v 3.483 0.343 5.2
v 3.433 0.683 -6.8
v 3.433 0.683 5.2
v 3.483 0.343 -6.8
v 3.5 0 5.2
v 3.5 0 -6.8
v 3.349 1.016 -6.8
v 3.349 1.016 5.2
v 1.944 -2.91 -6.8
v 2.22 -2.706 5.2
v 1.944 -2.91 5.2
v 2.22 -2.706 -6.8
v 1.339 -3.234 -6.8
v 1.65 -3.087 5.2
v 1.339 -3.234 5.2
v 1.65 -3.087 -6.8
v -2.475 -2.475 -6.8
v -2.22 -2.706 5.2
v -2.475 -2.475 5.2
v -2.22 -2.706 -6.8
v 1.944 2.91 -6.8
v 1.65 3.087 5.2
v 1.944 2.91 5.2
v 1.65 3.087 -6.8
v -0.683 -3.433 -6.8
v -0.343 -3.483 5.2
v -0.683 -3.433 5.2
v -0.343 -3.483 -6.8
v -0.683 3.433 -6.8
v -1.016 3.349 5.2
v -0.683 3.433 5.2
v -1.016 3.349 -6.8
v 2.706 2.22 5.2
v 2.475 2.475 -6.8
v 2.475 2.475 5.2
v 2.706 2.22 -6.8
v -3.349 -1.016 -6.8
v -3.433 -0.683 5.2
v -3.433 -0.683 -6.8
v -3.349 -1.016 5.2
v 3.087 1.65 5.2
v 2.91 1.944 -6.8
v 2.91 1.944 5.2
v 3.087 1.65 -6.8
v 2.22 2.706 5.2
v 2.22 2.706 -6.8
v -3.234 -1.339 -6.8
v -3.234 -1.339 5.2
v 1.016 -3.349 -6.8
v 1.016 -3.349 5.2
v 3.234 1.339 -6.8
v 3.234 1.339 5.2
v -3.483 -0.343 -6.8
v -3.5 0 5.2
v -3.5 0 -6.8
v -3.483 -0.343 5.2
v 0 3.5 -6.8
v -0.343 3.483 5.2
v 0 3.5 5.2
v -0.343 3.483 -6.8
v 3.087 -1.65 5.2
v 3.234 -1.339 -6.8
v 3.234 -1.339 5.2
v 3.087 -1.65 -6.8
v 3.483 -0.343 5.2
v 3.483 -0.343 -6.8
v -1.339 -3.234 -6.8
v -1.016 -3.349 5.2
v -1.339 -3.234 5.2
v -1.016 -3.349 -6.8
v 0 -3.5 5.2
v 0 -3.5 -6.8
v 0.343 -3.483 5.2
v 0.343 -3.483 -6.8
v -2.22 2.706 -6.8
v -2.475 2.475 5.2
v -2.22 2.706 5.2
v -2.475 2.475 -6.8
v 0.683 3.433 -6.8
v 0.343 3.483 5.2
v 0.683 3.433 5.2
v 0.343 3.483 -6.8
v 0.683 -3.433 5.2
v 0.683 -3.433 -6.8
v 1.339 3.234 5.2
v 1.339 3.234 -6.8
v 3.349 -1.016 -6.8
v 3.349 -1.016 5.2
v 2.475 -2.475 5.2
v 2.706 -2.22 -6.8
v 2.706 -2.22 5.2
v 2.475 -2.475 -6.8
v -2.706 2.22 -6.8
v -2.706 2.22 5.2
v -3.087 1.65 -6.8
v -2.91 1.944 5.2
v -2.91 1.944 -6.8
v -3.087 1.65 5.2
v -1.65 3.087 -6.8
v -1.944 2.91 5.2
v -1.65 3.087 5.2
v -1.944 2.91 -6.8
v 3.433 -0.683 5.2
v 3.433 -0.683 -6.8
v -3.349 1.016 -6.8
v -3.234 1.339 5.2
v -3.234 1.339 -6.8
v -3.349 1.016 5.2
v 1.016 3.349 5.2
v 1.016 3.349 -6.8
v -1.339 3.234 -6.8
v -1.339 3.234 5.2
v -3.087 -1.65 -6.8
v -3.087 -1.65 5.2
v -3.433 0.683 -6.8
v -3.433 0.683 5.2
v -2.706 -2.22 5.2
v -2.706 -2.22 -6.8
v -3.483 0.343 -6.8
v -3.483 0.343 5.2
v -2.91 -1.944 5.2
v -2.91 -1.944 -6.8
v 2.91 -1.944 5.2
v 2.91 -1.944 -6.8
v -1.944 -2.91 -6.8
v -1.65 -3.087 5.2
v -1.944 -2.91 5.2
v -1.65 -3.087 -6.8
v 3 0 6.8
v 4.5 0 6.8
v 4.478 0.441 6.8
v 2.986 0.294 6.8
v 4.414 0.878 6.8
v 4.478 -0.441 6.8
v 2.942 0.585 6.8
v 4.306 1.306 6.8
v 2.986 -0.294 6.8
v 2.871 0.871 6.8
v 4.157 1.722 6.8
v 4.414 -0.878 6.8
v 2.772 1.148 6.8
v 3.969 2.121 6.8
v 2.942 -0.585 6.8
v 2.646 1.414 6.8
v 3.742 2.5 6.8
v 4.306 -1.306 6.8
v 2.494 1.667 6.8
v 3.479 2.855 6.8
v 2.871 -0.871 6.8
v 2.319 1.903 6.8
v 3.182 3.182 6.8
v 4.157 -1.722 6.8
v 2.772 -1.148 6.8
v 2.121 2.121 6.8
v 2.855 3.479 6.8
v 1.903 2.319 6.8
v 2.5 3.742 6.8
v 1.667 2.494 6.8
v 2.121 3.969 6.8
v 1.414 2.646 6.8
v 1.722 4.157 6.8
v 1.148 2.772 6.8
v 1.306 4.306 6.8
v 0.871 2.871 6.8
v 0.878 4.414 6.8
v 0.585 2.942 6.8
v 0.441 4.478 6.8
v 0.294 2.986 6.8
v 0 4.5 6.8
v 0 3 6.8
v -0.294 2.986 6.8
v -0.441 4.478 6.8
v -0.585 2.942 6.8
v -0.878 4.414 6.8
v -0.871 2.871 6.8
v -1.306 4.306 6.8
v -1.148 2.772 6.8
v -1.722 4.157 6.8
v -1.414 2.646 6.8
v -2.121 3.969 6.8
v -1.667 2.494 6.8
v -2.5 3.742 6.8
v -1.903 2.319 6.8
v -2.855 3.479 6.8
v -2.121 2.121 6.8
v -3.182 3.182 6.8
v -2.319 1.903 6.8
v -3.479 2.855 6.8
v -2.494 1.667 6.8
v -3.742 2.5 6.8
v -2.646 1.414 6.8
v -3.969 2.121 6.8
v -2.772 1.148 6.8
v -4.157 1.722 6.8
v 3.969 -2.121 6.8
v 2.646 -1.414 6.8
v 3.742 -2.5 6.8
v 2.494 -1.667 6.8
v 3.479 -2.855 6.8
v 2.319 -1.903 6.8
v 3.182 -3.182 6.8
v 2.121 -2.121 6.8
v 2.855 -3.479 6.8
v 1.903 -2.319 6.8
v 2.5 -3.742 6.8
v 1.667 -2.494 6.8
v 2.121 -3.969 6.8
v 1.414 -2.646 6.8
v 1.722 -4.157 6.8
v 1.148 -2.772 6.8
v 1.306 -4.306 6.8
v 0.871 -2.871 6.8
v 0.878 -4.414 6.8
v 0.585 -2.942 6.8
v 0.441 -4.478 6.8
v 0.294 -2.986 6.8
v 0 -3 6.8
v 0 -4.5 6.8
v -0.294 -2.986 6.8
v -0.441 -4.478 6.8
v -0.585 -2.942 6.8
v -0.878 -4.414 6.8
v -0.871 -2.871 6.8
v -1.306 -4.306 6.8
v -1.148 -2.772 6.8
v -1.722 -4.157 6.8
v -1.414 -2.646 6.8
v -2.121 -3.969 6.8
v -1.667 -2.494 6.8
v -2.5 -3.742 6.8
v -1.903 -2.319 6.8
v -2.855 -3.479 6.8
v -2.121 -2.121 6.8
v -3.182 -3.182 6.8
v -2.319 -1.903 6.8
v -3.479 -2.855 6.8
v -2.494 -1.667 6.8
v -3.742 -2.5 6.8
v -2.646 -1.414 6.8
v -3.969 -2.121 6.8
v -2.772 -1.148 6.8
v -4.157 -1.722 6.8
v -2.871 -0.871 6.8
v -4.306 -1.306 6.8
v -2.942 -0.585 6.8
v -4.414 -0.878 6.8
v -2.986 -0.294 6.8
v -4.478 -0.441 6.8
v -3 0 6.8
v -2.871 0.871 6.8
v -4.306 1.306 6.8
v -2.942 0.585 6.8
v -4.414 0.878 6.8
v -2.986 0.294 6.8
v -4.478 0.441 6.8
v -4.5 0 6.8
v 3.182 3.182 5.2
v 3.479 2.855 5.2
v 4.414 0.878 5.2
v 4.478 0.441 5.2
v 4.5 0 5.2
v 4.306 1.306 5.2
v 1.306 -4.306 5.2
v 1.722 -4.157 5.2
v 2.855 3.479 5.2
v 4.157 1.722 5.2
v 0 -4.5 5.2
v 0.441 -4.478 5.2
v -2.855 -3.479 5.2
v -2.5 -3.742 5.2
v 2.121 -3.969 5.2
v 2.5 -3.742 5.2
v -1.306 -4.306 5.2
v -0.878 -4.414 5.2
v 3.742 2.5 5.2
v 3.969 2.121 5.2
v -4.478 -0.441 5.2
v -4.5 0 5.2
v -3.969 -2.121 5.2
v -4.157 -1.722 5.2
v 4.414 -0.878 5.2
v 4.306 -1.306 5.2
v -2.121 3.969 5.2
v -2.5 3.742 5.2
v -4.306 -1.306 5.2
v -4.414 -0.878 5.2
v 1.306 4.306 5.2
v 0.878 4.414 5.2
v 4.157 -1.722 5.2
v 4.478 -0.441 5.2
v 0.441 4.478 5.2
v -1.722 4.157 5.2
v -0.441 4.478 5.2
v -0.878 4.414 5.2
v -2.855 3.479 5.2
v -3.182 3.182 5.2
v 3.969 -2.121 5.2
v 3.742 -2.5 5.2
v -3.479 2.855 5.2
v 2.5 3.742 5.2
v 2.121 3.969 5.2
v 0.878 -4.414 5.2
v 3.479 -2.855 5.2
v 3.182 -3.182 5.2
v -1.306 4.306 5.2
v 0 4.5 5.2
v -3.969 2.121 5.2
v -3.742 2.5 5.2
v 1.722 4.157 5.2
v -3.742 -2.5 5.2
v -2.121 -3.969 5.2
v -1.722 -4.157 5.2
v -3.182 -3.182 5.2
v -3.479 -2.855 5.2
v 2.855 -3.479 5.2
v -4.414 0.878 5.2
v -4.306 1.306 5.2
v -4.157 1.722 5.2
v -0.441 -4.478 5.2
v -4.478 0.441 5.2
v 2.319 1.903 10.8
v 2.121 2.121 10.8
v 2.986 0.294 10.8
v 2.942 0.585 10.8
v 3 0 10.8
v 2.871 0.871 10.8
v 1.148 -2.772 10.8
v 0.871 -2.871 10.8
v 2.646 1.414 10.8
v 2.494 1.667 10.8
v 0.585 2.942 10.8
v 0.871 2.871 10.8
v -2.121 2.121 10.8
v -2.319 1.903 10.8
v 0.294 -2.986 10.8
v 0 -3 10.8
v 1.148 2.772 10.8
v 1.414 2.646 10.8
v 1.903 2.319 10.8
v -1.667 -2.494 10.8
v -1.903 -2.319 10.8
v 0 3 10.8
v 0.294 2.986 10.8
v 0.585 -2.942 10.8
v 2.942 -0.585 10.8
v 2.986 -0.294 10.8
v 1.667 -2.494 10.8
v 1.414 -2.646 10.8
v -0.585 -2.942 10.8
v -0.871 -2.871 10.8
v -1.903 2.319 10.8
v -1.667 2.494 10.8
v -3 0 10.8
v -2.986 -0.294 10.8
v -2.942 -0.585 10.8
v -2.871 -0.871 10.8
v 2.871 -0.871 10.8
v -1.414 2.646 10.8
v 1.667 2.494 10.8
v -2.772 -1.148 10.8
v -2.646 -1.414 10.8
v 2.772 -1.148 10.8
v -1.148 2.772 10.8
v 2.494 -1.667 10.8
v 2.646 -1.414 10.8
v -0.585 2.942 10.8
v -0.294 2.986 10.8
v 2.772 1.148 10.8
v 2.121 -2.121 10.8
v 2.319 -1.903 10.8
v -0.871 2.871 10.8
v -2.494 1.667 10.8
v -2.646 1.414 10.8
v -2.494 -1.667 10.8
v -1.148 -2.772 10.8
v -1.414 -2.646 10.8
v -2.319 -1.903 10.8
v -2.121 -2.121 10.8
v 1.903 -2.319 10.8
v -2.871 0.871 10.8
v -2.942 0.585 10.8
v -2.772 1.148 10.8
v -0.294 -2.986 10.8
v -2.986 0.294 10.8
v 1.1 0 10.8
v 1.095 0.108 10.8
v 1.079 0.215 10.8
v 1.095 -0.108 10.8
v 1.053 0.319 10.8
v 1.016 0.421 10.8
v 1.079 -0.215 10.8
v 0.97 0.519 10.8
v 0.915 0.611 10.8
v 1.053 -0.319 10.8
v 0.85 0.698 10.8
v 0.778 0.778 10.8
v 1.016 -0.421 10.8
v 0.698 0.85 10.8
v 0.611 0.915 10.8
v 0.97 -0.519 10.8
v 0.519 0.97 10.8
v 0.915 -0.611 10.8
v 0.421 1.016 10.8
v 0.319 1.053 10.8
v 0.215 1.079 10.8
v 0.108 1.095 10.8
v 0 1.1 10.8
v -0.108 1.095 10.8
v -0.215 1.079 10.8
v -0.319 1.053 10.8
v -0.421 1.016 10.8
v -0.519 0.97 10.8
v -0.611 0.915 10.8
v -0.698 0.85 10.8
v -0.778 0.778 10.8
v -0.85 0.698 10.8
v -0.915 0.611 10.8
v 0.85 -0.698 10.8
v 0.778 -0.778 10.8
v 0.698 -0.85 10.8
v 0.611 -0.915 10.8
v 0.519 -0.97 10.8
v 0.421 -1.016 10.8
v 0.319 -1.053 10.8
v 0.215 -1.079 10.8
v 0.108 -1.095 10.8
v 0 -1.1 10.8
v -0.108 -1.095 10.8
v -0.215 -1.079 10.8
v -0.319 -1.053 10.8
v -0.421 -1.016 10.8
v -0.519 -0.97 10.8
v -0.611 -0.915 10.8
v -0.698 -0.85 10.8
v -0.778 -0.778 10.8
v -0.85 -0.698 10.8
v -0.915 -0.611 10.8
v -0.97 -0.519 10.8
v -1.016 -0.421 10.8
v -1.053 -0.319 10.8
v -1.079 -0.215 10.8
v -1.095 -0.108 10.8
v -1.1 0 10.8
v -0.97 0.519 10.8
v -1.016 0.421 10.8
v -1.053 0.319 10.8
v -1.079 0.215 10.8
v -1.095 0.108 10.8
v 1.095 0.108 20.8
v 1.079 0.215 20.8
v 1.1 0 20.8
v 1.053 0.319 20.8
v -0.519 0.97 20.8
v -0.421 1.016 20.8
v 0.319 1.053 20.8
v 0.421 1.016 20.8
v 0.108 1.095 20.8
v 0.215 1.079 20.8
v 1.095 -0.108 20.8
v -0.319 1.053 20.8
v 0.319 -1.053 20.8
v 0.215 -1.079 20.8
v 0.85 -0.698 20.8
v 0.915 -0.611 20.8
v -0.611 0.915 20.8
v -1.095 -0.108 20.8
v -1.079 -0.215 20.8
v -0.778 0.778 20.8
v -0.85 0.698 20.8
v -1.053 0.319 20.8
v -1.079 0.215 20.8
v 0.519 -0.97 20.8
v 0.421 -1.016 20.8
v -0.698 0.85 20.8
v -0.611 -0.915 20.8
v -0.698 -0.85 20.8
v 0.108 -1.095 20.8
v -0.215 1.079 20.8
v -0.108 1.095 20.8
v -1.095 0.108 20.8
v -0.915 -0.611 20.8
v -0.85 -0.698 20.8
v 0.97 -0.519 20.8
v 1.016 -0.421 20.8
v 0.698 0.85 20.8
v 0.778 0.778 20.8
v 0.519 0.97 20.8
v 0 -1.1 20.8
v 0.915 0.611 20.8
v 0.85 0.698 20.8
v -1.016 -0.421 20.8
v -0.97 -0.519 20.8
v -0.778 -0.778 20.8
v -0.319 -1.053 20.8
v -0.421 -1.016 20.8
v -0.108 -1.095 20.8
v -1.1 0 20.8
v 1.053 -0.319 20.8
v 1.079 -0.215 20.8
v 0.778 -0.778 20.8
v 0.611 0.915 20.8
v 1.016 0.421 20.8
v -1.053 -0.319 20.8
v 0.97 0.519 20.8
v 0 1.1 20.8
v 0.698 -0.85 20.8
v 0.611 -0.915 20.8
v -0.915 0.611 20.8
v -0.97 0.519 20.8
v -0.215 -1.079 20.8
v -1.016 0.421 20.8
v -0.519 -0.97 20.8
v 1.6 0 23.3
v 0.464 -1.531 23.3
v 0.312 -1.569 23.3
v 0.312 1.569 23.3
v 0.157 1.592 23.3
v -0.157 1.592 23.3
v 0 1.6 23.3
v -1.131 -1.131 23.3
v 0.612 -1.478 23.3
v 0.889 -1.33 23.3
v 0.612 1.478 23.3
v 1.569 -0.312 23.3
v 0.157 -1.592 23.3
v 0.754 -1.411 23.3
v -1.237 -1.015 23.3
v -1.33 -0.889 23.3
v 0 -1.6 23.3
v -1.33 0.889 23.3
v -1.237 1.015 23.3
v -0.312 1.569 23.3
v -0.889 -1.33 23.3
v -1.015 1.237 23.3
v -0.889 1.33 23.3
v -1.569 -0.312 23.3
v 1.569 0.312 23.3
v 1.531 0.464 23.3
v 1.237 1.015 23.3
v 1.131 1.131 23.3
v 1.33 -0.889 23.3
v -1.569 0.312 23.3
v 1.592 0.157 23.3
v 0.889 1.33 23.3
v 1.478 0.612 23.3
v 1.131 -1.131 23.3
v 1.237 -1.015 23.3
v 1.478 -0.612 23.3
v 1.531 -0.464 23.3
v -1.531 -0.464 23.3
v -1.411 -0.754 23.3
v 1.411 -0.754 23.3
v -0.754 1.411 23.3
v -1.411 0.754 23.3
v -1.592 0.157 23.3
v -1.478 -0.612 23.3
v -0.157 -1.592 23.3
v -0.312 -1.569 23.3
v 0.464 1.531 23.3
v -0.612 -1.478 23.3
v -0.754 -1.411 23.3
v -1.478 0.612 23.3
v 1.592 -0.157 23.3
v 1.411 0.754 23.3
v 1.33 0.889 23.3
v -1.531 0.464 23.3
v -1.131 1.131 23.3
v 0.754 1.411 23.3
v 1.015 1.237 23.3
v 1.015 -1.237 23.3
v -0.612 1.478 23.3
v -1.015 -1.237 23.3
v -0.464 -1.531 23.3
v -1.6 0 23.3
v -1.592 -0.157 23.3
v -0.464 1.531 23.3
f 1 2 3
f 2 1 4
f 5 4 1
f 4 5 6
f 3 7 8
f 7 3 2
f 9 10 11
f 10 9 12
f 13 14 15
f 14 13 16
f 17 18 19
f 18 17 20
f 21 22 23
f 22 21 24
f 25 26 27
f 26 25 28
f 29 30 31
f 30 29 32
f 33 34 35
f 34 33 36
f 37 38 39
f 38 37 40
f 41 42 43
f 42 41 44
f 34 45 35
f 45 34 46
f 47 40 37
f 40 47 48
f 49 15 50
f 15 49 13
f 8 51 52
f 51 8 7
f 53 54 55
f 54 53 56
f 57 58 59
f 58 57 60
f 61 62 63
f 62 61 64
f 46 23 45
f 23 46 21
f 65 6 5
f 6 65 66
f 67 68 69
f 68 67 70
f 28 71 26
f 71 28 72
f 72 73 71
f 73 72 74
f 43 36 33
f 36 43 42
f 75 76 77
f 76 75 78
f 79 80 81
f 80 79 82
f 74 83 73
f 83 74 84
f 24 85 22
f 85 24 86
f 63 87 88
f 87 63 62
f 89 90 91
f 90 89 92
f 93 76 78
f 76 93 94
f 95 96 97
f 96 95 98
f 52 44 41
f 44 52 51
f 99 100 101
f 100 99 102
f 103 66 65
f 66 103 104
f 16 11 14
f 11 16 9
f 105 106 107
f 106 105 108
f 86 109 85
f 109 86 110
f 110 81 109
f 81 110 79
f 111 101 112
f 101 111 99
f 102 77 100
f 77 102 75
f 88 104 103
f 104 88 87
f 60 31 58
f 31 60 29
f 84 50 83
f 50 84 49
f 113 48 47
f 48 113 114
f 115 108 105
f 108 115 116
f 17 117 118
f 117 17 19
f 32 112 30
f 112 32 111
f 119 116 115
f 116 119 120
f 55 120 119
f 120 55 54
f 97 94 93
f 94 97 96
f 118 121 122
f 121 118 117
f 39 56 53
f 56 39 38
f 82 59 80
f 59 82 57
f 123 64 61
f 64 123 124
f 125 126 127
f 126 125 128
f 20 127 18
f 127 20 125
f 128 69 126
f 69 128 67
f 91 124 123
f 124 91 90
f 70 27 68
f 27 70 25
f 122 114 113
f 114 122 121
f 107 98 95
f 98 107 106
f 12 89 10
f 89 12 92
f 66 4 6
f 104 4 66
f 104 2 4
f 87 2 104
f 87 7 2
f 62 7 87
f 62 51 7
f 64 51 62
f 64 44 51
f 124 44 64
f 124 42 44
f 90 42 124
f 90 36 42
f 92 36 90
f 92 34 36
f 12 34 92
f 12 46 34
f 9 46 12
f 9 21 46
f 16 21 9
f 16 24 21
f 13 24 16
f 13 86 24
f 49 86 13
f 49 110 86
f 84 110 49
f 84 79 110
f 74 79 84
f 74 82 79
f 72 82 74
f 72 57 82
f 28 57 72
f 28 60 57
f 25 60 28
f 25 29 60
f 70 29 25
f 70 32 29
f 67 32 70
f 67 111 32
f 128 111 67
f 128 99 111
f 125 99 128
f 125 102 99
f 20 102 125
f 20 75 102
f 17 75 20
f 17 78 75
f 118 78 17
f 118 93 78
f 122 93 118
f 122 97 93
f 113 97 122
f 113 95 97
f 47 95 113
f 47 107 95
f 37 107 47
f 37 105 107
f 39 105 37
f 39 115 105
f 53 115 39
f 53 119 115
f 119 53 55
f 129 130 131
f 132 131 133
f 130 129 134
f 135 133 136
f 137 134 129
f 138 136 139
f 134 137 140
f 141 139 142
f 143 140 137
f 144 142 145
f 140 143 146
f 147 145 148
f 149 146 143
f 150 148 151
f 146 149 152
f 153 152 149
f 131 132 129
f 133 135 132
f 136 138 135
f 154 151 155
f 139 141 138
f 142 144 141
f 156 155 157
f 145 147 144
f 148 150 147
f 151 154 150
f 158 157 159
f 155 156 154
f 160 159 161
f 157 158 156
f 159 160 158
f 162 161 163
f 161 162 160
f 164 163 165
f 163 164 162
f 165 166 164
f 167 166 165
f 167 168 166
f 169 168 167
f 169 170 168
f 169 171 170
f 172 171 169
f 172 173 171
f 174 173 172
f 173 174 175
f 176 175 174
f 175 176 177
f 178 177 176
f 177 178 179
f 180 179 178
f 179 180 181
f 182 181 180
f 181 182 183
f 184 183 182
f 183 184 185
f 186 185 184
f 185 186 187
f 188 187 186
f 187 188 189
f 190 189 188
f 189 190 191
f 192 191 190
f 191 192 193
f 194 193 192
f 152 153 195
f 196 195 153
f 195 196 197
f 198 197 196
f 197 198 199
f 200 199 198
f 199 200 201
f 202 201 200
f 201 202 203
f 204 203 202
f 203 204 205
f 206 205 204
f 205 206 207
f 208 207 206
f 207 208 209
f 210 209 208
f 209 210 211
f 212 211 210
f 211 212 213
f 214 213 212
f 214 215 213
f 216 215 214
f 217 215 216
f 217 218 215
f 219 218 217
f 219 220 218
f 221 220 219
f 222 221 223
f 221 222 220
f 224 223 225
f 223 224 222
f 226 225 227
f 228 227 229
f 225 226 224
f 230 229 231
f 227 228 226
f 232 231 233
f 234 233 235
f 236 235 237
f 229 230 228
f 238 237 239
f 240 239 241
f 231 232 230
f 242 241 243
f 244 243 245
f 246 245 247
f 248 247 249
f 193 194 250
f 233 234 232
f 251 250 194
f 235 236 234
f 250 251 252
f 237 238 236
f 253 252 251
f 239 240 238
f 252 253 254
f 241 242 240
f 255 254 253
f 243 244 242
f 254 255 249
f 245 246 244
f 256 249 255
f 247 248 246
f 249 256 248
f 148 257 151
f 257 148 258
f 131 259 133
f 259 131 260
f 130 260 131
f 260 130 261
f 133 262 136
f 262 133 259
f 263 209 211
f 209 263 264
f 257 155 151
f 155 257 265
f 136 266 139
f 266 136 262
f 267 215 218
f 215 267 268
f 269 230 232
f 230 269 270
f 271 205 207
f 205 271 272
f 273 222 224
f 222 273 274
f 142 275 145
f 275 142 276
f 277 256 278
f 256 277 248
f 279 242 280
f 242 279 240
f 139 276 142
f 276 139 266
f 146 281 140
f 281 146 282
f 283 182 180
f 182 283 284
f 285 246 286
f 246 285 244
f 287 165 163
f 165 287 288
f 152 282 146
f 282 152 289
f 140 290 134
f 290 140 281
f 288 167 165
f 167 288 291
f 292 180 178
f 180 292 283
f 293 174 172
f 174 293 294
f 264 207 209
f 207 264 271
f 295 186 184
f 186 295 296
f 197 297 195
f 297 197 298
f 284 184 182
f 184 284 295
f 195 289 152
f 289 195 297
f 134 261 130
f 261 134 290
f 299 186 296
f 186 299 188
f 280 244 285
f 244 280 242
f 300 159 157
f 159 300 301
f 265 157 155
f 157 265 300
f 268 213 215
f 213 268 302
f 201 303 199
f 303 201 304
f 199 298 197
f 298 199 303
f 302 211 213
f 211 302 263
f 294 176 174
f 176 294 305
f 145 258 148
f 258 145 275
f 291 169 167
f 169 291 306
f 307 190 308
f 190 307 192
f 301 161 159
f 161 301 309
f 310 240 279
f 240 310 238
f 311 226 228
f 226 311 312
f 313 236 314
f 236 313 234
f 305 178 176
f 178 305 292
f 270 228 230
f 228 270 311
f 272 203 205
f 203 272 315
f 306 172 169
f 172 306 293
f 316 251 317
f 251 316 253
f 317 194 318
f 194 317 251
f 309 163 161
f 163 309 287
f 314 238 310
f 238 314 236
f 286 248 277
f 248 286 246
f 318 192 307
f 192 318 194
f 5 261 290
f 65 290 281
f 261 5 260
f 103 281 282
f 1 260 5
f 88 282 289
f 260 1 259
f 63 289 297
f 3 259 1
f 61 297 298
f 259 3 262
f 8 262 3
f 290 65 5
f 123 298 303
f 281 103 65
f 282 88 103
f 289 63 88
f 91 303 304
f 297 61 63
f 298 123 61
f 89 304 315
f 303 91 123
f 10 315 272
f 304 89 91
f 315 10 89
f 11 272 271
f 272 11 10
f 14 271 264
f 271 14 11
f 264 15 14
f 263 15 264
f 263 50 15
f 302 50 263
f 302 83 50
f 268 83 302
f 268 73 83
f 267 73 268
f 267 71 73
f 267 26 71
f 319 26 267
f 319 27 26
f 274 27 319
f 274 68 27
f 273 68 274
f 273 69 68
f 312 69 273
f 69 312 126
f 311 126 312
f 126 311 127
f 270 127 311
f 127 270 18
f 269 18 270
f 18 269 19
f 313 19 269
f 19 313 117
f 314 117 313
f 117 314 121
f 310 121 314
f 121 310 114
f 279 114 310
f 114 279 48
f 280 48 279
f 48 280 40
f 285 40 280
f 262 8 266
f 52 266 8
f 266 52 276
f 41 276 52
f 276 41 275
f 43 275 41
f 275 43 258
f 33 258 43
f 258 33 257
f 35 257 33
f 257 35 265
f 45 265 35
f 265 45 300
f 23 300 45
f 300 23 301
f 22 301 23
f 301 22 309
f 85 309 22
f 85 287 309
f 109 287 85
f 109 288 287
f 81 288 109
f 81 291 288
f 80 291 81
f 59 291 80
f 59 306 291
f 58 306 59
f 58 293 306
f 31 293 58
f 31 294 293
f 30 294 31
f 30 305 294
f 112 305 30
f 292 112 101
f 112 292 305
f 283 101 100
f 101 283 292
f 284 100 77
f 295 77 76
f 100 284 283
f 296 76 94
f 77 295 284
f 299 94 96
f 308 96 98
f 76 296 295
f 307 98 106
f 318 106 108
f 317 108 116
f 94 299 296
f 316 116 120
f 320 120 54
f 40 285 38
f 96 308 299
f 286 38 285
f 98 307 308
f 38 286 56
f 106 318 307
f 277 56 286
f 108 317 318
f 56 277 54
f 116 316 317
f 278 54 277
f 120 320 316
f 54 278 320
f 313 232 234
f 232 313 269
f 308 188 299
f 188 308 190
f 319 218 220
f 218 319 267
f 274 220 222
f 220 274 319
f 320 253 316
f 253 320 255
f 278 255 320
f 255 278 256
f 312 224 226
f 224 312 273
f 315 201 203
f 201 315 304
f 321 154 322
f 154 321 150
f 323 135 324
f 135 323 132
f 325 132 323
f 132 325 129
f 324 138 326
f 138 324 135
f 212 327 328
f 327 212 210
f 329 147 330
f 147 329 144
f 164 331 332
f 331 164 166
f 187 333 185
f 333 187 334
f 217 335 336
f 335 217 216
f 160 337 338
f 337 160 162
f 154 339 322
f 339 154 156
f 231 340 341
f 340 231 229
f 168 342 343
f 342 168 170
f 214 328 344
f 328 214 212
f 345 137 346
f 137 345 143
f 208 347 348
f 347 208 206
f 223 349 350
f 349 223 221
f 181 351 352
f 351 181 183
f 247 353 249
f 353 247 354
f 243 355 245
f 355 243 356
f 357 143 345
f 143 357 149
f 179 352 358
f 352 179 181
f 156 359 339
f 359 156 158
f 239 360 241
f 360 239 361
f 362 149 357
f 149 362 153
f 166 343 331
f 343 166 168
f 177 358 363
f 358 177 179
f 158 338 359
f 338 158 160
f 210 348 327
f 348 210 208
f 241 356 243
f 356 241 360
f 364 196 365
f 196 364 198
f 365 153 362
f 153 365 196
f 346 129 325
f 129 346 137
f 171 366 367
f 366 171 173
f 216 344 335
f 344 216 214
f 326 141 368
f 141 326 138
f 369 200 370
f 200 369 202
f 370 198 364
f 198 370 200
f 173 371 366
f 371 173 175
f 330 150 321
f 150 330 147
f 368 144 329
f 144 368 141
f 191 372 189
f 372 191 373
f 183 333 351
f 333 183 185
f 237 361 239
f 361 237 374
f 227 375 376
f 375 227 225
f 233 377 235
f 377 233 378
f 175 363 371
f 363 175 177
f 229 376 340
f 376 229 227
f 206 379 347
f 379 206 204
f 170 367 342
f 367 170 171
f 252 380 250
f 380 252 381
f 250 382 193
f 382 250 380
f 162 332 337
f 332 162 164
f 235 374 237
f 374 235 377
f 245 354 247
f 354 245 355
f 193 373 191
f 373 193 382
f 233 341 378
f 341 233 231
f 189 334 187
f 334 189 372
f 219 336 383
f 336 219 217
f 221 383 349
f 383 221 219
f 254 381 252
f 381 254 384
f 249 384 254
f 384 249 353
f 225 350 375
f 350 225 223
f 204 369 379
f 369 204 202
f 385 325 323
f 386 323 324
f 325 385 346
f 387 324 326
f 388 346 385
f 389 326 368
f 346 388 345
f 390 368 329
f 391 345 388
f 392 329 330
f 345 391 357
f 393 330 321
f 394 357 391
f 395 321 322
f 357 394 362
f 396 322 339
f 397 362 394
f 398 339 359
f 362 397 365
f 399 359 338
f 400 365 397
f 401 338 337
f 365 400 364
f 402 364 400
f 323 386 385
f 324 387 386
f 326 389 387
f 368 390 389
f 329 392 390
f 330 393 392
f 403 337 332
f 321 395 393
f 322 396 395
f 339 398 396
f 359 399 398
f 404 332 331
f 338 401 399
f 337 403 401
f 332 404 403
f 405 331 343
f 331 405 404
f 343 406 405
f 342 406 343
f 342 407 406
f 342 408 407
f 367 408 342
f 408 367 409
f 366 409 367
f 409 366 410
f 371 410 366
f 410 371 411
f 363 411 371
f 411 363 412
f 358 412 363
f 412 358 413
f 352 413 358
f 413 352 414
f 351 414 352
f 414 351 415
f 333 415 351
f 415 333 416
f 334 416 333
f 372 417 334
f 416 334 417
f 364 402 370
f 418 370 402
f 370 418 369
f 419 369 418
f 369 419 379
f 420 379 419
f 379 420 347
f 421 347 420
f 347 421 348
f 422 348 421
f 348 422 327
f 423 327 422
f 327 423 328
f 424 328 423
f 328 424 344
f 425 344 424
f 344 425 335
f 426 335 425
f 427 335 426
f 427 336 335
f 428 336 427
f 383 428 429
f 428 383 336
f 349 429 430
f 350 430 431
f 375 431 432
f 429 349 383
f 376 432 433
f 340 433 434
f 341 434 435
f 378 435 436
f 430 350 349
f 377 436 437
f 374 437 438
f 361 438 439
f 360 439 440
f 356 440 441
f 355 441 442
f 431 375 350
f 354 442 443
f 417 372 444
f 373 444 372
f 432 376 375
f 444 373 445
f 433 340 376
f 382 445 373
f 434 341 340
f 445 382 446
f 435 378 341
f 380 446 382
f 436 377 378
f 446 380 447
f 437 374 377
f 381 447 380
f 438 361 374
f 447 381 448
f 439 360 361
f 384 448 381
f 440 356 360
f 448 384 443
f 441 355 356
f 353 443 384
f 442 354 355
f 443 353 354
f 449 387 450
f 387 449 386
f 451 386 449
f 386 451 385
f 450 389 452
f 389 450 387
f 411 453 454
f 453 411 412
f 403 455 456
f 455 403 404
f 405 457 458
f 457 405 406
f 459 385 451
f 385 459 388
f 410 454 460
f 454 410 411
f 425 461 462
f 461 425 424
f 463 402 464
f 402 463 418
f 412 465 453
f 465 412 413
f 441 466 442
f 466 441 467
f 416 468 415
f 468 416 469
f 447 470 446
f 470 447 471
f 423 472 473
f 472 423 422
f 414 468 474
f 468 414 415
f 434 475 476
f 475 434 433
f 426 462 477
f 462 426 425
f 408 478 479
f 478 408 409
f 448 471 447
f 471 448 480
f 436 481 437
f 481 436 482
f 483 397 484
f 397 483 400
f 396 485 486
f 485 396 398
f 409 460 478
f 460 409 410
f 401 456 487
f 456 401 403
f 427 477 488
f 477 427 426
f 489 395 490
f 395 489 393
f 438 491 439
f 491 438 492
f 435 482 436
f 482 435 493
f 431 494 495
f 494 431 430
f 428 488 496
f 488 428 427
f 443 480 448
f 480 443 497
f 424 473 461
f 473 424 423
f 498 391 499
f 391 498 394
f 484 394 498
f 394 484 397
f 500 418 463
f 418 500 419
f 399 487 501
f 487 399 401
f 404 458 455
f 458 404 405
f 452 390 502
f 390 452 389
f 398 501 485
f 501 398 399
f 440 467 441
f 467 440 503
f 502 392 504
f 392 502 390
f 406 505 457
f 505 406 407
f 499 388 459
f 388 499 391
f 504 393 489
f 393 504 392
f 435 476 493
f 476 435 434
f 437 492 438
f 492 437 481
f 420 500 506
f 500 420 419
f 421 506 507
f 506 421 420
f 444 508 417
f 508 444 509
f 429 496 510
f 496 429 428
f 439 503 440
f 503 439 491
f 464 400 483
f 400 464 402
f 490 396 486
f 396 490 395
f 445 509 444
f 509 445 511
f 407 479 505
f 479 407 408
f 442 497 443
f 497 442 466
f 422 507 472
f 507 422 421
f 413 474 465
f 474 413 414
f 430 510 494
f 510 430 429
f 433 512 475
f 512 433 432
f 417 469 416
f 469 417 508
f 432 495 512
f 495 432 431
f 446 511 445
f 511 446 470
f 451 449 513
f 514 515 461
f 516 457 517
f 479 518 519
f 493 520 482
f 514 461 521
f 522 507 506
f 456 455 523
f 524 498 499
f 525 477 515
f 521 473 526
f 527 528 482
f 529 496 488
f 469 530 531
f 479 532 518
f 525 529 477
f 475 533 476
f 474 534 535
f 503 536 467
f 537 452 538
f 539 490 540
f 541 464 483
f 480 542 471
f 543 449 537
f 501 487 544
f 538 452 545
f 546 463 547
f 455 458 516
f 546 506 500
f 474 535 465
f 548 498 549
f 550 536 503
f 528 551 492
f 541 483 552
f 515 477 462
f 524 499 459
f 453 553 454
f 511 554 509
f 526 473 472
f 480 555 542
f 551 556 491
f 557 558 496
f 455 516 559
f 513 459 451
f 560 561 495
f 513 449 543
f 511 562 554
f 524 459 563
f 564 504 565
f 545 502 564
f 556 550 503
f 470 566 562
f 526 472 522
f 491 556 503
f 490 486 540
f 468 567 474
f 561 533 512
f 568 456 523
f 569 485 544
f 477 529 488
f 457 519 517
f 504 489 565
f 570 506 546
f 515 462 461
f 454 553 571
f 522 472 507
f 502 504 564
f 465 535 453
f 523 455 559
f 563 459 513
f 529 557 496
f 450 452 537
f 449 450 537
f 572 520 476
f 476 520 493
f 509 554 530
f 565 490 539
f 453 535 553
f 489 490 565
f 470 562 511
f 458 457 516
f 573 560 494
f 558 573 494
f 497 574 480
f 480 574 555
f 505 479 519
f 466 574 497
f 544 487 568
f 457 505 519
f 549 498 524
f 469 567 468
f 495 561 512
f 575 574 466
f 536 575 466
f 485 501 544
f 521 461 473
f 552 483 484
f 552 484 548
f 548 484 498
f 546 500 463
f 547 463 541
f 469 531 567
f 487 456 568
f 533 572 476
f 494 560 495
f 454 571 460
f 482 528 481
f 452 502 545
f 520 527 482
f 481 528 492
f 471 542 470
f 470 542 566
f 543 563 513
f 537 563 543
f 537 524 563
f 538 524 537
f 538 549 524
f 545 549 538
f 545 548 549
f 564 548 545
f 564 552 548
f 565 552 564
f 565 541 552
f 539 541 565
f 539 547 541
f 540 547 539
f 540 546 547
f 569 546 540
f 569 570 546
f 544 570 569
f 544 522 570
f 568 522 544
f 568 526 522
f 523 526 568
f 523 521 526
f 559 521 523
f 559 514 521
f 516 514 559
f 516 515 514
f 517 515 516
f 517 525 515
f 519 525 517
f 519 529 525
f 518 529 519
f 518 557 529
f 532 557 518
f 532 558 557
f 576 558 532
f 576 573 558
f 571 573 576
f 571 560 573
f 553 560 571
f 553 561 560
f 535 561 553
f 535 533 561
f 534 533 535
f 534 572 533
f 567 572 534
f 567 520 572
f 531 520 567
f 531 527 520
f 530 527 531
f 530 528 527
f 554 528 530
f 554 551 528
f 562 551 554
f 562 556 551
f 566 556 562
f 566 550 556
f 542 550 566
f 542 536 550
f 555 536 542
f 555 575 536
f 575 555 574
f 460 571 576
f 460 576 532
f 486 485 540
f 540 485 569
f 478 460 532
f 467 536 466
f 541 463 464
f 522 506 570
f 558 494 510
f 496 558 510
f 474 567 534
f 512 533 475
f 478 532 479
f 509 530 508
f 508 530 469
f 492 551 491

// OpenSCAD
$fn=64;

module toggle_switch(body_d=7.0, body_h=13.6, collar_d=9.0, collar_h=1.6, bushing_d=6.0, bushing_h=4.0, lever_d=2.2, lever_h=10.0, tip_d=3.2, tip_h=2.5) {
    union() {
        translate([0,0,-body_h/2])
            cylinder(d=body_d, h=body_h);

        translate([0,0,body_h/2 - collar_h])
            cylinder(d=collar_d, h=collar_h);

        translate([0,0,body_h/2])
            cylinder(d=bushing_d, h=bushing_h);

        translate([0,0,body_h/2 + bushing_h])
            cylinder(d=lever_d, h=lever_h);

        translate([0,0,body_h/2 + bushing_h + lever_h])
            cylinder(d1=lever_d, d2=tip_d, h=tip_h);
    }
}

toggle_switch();
